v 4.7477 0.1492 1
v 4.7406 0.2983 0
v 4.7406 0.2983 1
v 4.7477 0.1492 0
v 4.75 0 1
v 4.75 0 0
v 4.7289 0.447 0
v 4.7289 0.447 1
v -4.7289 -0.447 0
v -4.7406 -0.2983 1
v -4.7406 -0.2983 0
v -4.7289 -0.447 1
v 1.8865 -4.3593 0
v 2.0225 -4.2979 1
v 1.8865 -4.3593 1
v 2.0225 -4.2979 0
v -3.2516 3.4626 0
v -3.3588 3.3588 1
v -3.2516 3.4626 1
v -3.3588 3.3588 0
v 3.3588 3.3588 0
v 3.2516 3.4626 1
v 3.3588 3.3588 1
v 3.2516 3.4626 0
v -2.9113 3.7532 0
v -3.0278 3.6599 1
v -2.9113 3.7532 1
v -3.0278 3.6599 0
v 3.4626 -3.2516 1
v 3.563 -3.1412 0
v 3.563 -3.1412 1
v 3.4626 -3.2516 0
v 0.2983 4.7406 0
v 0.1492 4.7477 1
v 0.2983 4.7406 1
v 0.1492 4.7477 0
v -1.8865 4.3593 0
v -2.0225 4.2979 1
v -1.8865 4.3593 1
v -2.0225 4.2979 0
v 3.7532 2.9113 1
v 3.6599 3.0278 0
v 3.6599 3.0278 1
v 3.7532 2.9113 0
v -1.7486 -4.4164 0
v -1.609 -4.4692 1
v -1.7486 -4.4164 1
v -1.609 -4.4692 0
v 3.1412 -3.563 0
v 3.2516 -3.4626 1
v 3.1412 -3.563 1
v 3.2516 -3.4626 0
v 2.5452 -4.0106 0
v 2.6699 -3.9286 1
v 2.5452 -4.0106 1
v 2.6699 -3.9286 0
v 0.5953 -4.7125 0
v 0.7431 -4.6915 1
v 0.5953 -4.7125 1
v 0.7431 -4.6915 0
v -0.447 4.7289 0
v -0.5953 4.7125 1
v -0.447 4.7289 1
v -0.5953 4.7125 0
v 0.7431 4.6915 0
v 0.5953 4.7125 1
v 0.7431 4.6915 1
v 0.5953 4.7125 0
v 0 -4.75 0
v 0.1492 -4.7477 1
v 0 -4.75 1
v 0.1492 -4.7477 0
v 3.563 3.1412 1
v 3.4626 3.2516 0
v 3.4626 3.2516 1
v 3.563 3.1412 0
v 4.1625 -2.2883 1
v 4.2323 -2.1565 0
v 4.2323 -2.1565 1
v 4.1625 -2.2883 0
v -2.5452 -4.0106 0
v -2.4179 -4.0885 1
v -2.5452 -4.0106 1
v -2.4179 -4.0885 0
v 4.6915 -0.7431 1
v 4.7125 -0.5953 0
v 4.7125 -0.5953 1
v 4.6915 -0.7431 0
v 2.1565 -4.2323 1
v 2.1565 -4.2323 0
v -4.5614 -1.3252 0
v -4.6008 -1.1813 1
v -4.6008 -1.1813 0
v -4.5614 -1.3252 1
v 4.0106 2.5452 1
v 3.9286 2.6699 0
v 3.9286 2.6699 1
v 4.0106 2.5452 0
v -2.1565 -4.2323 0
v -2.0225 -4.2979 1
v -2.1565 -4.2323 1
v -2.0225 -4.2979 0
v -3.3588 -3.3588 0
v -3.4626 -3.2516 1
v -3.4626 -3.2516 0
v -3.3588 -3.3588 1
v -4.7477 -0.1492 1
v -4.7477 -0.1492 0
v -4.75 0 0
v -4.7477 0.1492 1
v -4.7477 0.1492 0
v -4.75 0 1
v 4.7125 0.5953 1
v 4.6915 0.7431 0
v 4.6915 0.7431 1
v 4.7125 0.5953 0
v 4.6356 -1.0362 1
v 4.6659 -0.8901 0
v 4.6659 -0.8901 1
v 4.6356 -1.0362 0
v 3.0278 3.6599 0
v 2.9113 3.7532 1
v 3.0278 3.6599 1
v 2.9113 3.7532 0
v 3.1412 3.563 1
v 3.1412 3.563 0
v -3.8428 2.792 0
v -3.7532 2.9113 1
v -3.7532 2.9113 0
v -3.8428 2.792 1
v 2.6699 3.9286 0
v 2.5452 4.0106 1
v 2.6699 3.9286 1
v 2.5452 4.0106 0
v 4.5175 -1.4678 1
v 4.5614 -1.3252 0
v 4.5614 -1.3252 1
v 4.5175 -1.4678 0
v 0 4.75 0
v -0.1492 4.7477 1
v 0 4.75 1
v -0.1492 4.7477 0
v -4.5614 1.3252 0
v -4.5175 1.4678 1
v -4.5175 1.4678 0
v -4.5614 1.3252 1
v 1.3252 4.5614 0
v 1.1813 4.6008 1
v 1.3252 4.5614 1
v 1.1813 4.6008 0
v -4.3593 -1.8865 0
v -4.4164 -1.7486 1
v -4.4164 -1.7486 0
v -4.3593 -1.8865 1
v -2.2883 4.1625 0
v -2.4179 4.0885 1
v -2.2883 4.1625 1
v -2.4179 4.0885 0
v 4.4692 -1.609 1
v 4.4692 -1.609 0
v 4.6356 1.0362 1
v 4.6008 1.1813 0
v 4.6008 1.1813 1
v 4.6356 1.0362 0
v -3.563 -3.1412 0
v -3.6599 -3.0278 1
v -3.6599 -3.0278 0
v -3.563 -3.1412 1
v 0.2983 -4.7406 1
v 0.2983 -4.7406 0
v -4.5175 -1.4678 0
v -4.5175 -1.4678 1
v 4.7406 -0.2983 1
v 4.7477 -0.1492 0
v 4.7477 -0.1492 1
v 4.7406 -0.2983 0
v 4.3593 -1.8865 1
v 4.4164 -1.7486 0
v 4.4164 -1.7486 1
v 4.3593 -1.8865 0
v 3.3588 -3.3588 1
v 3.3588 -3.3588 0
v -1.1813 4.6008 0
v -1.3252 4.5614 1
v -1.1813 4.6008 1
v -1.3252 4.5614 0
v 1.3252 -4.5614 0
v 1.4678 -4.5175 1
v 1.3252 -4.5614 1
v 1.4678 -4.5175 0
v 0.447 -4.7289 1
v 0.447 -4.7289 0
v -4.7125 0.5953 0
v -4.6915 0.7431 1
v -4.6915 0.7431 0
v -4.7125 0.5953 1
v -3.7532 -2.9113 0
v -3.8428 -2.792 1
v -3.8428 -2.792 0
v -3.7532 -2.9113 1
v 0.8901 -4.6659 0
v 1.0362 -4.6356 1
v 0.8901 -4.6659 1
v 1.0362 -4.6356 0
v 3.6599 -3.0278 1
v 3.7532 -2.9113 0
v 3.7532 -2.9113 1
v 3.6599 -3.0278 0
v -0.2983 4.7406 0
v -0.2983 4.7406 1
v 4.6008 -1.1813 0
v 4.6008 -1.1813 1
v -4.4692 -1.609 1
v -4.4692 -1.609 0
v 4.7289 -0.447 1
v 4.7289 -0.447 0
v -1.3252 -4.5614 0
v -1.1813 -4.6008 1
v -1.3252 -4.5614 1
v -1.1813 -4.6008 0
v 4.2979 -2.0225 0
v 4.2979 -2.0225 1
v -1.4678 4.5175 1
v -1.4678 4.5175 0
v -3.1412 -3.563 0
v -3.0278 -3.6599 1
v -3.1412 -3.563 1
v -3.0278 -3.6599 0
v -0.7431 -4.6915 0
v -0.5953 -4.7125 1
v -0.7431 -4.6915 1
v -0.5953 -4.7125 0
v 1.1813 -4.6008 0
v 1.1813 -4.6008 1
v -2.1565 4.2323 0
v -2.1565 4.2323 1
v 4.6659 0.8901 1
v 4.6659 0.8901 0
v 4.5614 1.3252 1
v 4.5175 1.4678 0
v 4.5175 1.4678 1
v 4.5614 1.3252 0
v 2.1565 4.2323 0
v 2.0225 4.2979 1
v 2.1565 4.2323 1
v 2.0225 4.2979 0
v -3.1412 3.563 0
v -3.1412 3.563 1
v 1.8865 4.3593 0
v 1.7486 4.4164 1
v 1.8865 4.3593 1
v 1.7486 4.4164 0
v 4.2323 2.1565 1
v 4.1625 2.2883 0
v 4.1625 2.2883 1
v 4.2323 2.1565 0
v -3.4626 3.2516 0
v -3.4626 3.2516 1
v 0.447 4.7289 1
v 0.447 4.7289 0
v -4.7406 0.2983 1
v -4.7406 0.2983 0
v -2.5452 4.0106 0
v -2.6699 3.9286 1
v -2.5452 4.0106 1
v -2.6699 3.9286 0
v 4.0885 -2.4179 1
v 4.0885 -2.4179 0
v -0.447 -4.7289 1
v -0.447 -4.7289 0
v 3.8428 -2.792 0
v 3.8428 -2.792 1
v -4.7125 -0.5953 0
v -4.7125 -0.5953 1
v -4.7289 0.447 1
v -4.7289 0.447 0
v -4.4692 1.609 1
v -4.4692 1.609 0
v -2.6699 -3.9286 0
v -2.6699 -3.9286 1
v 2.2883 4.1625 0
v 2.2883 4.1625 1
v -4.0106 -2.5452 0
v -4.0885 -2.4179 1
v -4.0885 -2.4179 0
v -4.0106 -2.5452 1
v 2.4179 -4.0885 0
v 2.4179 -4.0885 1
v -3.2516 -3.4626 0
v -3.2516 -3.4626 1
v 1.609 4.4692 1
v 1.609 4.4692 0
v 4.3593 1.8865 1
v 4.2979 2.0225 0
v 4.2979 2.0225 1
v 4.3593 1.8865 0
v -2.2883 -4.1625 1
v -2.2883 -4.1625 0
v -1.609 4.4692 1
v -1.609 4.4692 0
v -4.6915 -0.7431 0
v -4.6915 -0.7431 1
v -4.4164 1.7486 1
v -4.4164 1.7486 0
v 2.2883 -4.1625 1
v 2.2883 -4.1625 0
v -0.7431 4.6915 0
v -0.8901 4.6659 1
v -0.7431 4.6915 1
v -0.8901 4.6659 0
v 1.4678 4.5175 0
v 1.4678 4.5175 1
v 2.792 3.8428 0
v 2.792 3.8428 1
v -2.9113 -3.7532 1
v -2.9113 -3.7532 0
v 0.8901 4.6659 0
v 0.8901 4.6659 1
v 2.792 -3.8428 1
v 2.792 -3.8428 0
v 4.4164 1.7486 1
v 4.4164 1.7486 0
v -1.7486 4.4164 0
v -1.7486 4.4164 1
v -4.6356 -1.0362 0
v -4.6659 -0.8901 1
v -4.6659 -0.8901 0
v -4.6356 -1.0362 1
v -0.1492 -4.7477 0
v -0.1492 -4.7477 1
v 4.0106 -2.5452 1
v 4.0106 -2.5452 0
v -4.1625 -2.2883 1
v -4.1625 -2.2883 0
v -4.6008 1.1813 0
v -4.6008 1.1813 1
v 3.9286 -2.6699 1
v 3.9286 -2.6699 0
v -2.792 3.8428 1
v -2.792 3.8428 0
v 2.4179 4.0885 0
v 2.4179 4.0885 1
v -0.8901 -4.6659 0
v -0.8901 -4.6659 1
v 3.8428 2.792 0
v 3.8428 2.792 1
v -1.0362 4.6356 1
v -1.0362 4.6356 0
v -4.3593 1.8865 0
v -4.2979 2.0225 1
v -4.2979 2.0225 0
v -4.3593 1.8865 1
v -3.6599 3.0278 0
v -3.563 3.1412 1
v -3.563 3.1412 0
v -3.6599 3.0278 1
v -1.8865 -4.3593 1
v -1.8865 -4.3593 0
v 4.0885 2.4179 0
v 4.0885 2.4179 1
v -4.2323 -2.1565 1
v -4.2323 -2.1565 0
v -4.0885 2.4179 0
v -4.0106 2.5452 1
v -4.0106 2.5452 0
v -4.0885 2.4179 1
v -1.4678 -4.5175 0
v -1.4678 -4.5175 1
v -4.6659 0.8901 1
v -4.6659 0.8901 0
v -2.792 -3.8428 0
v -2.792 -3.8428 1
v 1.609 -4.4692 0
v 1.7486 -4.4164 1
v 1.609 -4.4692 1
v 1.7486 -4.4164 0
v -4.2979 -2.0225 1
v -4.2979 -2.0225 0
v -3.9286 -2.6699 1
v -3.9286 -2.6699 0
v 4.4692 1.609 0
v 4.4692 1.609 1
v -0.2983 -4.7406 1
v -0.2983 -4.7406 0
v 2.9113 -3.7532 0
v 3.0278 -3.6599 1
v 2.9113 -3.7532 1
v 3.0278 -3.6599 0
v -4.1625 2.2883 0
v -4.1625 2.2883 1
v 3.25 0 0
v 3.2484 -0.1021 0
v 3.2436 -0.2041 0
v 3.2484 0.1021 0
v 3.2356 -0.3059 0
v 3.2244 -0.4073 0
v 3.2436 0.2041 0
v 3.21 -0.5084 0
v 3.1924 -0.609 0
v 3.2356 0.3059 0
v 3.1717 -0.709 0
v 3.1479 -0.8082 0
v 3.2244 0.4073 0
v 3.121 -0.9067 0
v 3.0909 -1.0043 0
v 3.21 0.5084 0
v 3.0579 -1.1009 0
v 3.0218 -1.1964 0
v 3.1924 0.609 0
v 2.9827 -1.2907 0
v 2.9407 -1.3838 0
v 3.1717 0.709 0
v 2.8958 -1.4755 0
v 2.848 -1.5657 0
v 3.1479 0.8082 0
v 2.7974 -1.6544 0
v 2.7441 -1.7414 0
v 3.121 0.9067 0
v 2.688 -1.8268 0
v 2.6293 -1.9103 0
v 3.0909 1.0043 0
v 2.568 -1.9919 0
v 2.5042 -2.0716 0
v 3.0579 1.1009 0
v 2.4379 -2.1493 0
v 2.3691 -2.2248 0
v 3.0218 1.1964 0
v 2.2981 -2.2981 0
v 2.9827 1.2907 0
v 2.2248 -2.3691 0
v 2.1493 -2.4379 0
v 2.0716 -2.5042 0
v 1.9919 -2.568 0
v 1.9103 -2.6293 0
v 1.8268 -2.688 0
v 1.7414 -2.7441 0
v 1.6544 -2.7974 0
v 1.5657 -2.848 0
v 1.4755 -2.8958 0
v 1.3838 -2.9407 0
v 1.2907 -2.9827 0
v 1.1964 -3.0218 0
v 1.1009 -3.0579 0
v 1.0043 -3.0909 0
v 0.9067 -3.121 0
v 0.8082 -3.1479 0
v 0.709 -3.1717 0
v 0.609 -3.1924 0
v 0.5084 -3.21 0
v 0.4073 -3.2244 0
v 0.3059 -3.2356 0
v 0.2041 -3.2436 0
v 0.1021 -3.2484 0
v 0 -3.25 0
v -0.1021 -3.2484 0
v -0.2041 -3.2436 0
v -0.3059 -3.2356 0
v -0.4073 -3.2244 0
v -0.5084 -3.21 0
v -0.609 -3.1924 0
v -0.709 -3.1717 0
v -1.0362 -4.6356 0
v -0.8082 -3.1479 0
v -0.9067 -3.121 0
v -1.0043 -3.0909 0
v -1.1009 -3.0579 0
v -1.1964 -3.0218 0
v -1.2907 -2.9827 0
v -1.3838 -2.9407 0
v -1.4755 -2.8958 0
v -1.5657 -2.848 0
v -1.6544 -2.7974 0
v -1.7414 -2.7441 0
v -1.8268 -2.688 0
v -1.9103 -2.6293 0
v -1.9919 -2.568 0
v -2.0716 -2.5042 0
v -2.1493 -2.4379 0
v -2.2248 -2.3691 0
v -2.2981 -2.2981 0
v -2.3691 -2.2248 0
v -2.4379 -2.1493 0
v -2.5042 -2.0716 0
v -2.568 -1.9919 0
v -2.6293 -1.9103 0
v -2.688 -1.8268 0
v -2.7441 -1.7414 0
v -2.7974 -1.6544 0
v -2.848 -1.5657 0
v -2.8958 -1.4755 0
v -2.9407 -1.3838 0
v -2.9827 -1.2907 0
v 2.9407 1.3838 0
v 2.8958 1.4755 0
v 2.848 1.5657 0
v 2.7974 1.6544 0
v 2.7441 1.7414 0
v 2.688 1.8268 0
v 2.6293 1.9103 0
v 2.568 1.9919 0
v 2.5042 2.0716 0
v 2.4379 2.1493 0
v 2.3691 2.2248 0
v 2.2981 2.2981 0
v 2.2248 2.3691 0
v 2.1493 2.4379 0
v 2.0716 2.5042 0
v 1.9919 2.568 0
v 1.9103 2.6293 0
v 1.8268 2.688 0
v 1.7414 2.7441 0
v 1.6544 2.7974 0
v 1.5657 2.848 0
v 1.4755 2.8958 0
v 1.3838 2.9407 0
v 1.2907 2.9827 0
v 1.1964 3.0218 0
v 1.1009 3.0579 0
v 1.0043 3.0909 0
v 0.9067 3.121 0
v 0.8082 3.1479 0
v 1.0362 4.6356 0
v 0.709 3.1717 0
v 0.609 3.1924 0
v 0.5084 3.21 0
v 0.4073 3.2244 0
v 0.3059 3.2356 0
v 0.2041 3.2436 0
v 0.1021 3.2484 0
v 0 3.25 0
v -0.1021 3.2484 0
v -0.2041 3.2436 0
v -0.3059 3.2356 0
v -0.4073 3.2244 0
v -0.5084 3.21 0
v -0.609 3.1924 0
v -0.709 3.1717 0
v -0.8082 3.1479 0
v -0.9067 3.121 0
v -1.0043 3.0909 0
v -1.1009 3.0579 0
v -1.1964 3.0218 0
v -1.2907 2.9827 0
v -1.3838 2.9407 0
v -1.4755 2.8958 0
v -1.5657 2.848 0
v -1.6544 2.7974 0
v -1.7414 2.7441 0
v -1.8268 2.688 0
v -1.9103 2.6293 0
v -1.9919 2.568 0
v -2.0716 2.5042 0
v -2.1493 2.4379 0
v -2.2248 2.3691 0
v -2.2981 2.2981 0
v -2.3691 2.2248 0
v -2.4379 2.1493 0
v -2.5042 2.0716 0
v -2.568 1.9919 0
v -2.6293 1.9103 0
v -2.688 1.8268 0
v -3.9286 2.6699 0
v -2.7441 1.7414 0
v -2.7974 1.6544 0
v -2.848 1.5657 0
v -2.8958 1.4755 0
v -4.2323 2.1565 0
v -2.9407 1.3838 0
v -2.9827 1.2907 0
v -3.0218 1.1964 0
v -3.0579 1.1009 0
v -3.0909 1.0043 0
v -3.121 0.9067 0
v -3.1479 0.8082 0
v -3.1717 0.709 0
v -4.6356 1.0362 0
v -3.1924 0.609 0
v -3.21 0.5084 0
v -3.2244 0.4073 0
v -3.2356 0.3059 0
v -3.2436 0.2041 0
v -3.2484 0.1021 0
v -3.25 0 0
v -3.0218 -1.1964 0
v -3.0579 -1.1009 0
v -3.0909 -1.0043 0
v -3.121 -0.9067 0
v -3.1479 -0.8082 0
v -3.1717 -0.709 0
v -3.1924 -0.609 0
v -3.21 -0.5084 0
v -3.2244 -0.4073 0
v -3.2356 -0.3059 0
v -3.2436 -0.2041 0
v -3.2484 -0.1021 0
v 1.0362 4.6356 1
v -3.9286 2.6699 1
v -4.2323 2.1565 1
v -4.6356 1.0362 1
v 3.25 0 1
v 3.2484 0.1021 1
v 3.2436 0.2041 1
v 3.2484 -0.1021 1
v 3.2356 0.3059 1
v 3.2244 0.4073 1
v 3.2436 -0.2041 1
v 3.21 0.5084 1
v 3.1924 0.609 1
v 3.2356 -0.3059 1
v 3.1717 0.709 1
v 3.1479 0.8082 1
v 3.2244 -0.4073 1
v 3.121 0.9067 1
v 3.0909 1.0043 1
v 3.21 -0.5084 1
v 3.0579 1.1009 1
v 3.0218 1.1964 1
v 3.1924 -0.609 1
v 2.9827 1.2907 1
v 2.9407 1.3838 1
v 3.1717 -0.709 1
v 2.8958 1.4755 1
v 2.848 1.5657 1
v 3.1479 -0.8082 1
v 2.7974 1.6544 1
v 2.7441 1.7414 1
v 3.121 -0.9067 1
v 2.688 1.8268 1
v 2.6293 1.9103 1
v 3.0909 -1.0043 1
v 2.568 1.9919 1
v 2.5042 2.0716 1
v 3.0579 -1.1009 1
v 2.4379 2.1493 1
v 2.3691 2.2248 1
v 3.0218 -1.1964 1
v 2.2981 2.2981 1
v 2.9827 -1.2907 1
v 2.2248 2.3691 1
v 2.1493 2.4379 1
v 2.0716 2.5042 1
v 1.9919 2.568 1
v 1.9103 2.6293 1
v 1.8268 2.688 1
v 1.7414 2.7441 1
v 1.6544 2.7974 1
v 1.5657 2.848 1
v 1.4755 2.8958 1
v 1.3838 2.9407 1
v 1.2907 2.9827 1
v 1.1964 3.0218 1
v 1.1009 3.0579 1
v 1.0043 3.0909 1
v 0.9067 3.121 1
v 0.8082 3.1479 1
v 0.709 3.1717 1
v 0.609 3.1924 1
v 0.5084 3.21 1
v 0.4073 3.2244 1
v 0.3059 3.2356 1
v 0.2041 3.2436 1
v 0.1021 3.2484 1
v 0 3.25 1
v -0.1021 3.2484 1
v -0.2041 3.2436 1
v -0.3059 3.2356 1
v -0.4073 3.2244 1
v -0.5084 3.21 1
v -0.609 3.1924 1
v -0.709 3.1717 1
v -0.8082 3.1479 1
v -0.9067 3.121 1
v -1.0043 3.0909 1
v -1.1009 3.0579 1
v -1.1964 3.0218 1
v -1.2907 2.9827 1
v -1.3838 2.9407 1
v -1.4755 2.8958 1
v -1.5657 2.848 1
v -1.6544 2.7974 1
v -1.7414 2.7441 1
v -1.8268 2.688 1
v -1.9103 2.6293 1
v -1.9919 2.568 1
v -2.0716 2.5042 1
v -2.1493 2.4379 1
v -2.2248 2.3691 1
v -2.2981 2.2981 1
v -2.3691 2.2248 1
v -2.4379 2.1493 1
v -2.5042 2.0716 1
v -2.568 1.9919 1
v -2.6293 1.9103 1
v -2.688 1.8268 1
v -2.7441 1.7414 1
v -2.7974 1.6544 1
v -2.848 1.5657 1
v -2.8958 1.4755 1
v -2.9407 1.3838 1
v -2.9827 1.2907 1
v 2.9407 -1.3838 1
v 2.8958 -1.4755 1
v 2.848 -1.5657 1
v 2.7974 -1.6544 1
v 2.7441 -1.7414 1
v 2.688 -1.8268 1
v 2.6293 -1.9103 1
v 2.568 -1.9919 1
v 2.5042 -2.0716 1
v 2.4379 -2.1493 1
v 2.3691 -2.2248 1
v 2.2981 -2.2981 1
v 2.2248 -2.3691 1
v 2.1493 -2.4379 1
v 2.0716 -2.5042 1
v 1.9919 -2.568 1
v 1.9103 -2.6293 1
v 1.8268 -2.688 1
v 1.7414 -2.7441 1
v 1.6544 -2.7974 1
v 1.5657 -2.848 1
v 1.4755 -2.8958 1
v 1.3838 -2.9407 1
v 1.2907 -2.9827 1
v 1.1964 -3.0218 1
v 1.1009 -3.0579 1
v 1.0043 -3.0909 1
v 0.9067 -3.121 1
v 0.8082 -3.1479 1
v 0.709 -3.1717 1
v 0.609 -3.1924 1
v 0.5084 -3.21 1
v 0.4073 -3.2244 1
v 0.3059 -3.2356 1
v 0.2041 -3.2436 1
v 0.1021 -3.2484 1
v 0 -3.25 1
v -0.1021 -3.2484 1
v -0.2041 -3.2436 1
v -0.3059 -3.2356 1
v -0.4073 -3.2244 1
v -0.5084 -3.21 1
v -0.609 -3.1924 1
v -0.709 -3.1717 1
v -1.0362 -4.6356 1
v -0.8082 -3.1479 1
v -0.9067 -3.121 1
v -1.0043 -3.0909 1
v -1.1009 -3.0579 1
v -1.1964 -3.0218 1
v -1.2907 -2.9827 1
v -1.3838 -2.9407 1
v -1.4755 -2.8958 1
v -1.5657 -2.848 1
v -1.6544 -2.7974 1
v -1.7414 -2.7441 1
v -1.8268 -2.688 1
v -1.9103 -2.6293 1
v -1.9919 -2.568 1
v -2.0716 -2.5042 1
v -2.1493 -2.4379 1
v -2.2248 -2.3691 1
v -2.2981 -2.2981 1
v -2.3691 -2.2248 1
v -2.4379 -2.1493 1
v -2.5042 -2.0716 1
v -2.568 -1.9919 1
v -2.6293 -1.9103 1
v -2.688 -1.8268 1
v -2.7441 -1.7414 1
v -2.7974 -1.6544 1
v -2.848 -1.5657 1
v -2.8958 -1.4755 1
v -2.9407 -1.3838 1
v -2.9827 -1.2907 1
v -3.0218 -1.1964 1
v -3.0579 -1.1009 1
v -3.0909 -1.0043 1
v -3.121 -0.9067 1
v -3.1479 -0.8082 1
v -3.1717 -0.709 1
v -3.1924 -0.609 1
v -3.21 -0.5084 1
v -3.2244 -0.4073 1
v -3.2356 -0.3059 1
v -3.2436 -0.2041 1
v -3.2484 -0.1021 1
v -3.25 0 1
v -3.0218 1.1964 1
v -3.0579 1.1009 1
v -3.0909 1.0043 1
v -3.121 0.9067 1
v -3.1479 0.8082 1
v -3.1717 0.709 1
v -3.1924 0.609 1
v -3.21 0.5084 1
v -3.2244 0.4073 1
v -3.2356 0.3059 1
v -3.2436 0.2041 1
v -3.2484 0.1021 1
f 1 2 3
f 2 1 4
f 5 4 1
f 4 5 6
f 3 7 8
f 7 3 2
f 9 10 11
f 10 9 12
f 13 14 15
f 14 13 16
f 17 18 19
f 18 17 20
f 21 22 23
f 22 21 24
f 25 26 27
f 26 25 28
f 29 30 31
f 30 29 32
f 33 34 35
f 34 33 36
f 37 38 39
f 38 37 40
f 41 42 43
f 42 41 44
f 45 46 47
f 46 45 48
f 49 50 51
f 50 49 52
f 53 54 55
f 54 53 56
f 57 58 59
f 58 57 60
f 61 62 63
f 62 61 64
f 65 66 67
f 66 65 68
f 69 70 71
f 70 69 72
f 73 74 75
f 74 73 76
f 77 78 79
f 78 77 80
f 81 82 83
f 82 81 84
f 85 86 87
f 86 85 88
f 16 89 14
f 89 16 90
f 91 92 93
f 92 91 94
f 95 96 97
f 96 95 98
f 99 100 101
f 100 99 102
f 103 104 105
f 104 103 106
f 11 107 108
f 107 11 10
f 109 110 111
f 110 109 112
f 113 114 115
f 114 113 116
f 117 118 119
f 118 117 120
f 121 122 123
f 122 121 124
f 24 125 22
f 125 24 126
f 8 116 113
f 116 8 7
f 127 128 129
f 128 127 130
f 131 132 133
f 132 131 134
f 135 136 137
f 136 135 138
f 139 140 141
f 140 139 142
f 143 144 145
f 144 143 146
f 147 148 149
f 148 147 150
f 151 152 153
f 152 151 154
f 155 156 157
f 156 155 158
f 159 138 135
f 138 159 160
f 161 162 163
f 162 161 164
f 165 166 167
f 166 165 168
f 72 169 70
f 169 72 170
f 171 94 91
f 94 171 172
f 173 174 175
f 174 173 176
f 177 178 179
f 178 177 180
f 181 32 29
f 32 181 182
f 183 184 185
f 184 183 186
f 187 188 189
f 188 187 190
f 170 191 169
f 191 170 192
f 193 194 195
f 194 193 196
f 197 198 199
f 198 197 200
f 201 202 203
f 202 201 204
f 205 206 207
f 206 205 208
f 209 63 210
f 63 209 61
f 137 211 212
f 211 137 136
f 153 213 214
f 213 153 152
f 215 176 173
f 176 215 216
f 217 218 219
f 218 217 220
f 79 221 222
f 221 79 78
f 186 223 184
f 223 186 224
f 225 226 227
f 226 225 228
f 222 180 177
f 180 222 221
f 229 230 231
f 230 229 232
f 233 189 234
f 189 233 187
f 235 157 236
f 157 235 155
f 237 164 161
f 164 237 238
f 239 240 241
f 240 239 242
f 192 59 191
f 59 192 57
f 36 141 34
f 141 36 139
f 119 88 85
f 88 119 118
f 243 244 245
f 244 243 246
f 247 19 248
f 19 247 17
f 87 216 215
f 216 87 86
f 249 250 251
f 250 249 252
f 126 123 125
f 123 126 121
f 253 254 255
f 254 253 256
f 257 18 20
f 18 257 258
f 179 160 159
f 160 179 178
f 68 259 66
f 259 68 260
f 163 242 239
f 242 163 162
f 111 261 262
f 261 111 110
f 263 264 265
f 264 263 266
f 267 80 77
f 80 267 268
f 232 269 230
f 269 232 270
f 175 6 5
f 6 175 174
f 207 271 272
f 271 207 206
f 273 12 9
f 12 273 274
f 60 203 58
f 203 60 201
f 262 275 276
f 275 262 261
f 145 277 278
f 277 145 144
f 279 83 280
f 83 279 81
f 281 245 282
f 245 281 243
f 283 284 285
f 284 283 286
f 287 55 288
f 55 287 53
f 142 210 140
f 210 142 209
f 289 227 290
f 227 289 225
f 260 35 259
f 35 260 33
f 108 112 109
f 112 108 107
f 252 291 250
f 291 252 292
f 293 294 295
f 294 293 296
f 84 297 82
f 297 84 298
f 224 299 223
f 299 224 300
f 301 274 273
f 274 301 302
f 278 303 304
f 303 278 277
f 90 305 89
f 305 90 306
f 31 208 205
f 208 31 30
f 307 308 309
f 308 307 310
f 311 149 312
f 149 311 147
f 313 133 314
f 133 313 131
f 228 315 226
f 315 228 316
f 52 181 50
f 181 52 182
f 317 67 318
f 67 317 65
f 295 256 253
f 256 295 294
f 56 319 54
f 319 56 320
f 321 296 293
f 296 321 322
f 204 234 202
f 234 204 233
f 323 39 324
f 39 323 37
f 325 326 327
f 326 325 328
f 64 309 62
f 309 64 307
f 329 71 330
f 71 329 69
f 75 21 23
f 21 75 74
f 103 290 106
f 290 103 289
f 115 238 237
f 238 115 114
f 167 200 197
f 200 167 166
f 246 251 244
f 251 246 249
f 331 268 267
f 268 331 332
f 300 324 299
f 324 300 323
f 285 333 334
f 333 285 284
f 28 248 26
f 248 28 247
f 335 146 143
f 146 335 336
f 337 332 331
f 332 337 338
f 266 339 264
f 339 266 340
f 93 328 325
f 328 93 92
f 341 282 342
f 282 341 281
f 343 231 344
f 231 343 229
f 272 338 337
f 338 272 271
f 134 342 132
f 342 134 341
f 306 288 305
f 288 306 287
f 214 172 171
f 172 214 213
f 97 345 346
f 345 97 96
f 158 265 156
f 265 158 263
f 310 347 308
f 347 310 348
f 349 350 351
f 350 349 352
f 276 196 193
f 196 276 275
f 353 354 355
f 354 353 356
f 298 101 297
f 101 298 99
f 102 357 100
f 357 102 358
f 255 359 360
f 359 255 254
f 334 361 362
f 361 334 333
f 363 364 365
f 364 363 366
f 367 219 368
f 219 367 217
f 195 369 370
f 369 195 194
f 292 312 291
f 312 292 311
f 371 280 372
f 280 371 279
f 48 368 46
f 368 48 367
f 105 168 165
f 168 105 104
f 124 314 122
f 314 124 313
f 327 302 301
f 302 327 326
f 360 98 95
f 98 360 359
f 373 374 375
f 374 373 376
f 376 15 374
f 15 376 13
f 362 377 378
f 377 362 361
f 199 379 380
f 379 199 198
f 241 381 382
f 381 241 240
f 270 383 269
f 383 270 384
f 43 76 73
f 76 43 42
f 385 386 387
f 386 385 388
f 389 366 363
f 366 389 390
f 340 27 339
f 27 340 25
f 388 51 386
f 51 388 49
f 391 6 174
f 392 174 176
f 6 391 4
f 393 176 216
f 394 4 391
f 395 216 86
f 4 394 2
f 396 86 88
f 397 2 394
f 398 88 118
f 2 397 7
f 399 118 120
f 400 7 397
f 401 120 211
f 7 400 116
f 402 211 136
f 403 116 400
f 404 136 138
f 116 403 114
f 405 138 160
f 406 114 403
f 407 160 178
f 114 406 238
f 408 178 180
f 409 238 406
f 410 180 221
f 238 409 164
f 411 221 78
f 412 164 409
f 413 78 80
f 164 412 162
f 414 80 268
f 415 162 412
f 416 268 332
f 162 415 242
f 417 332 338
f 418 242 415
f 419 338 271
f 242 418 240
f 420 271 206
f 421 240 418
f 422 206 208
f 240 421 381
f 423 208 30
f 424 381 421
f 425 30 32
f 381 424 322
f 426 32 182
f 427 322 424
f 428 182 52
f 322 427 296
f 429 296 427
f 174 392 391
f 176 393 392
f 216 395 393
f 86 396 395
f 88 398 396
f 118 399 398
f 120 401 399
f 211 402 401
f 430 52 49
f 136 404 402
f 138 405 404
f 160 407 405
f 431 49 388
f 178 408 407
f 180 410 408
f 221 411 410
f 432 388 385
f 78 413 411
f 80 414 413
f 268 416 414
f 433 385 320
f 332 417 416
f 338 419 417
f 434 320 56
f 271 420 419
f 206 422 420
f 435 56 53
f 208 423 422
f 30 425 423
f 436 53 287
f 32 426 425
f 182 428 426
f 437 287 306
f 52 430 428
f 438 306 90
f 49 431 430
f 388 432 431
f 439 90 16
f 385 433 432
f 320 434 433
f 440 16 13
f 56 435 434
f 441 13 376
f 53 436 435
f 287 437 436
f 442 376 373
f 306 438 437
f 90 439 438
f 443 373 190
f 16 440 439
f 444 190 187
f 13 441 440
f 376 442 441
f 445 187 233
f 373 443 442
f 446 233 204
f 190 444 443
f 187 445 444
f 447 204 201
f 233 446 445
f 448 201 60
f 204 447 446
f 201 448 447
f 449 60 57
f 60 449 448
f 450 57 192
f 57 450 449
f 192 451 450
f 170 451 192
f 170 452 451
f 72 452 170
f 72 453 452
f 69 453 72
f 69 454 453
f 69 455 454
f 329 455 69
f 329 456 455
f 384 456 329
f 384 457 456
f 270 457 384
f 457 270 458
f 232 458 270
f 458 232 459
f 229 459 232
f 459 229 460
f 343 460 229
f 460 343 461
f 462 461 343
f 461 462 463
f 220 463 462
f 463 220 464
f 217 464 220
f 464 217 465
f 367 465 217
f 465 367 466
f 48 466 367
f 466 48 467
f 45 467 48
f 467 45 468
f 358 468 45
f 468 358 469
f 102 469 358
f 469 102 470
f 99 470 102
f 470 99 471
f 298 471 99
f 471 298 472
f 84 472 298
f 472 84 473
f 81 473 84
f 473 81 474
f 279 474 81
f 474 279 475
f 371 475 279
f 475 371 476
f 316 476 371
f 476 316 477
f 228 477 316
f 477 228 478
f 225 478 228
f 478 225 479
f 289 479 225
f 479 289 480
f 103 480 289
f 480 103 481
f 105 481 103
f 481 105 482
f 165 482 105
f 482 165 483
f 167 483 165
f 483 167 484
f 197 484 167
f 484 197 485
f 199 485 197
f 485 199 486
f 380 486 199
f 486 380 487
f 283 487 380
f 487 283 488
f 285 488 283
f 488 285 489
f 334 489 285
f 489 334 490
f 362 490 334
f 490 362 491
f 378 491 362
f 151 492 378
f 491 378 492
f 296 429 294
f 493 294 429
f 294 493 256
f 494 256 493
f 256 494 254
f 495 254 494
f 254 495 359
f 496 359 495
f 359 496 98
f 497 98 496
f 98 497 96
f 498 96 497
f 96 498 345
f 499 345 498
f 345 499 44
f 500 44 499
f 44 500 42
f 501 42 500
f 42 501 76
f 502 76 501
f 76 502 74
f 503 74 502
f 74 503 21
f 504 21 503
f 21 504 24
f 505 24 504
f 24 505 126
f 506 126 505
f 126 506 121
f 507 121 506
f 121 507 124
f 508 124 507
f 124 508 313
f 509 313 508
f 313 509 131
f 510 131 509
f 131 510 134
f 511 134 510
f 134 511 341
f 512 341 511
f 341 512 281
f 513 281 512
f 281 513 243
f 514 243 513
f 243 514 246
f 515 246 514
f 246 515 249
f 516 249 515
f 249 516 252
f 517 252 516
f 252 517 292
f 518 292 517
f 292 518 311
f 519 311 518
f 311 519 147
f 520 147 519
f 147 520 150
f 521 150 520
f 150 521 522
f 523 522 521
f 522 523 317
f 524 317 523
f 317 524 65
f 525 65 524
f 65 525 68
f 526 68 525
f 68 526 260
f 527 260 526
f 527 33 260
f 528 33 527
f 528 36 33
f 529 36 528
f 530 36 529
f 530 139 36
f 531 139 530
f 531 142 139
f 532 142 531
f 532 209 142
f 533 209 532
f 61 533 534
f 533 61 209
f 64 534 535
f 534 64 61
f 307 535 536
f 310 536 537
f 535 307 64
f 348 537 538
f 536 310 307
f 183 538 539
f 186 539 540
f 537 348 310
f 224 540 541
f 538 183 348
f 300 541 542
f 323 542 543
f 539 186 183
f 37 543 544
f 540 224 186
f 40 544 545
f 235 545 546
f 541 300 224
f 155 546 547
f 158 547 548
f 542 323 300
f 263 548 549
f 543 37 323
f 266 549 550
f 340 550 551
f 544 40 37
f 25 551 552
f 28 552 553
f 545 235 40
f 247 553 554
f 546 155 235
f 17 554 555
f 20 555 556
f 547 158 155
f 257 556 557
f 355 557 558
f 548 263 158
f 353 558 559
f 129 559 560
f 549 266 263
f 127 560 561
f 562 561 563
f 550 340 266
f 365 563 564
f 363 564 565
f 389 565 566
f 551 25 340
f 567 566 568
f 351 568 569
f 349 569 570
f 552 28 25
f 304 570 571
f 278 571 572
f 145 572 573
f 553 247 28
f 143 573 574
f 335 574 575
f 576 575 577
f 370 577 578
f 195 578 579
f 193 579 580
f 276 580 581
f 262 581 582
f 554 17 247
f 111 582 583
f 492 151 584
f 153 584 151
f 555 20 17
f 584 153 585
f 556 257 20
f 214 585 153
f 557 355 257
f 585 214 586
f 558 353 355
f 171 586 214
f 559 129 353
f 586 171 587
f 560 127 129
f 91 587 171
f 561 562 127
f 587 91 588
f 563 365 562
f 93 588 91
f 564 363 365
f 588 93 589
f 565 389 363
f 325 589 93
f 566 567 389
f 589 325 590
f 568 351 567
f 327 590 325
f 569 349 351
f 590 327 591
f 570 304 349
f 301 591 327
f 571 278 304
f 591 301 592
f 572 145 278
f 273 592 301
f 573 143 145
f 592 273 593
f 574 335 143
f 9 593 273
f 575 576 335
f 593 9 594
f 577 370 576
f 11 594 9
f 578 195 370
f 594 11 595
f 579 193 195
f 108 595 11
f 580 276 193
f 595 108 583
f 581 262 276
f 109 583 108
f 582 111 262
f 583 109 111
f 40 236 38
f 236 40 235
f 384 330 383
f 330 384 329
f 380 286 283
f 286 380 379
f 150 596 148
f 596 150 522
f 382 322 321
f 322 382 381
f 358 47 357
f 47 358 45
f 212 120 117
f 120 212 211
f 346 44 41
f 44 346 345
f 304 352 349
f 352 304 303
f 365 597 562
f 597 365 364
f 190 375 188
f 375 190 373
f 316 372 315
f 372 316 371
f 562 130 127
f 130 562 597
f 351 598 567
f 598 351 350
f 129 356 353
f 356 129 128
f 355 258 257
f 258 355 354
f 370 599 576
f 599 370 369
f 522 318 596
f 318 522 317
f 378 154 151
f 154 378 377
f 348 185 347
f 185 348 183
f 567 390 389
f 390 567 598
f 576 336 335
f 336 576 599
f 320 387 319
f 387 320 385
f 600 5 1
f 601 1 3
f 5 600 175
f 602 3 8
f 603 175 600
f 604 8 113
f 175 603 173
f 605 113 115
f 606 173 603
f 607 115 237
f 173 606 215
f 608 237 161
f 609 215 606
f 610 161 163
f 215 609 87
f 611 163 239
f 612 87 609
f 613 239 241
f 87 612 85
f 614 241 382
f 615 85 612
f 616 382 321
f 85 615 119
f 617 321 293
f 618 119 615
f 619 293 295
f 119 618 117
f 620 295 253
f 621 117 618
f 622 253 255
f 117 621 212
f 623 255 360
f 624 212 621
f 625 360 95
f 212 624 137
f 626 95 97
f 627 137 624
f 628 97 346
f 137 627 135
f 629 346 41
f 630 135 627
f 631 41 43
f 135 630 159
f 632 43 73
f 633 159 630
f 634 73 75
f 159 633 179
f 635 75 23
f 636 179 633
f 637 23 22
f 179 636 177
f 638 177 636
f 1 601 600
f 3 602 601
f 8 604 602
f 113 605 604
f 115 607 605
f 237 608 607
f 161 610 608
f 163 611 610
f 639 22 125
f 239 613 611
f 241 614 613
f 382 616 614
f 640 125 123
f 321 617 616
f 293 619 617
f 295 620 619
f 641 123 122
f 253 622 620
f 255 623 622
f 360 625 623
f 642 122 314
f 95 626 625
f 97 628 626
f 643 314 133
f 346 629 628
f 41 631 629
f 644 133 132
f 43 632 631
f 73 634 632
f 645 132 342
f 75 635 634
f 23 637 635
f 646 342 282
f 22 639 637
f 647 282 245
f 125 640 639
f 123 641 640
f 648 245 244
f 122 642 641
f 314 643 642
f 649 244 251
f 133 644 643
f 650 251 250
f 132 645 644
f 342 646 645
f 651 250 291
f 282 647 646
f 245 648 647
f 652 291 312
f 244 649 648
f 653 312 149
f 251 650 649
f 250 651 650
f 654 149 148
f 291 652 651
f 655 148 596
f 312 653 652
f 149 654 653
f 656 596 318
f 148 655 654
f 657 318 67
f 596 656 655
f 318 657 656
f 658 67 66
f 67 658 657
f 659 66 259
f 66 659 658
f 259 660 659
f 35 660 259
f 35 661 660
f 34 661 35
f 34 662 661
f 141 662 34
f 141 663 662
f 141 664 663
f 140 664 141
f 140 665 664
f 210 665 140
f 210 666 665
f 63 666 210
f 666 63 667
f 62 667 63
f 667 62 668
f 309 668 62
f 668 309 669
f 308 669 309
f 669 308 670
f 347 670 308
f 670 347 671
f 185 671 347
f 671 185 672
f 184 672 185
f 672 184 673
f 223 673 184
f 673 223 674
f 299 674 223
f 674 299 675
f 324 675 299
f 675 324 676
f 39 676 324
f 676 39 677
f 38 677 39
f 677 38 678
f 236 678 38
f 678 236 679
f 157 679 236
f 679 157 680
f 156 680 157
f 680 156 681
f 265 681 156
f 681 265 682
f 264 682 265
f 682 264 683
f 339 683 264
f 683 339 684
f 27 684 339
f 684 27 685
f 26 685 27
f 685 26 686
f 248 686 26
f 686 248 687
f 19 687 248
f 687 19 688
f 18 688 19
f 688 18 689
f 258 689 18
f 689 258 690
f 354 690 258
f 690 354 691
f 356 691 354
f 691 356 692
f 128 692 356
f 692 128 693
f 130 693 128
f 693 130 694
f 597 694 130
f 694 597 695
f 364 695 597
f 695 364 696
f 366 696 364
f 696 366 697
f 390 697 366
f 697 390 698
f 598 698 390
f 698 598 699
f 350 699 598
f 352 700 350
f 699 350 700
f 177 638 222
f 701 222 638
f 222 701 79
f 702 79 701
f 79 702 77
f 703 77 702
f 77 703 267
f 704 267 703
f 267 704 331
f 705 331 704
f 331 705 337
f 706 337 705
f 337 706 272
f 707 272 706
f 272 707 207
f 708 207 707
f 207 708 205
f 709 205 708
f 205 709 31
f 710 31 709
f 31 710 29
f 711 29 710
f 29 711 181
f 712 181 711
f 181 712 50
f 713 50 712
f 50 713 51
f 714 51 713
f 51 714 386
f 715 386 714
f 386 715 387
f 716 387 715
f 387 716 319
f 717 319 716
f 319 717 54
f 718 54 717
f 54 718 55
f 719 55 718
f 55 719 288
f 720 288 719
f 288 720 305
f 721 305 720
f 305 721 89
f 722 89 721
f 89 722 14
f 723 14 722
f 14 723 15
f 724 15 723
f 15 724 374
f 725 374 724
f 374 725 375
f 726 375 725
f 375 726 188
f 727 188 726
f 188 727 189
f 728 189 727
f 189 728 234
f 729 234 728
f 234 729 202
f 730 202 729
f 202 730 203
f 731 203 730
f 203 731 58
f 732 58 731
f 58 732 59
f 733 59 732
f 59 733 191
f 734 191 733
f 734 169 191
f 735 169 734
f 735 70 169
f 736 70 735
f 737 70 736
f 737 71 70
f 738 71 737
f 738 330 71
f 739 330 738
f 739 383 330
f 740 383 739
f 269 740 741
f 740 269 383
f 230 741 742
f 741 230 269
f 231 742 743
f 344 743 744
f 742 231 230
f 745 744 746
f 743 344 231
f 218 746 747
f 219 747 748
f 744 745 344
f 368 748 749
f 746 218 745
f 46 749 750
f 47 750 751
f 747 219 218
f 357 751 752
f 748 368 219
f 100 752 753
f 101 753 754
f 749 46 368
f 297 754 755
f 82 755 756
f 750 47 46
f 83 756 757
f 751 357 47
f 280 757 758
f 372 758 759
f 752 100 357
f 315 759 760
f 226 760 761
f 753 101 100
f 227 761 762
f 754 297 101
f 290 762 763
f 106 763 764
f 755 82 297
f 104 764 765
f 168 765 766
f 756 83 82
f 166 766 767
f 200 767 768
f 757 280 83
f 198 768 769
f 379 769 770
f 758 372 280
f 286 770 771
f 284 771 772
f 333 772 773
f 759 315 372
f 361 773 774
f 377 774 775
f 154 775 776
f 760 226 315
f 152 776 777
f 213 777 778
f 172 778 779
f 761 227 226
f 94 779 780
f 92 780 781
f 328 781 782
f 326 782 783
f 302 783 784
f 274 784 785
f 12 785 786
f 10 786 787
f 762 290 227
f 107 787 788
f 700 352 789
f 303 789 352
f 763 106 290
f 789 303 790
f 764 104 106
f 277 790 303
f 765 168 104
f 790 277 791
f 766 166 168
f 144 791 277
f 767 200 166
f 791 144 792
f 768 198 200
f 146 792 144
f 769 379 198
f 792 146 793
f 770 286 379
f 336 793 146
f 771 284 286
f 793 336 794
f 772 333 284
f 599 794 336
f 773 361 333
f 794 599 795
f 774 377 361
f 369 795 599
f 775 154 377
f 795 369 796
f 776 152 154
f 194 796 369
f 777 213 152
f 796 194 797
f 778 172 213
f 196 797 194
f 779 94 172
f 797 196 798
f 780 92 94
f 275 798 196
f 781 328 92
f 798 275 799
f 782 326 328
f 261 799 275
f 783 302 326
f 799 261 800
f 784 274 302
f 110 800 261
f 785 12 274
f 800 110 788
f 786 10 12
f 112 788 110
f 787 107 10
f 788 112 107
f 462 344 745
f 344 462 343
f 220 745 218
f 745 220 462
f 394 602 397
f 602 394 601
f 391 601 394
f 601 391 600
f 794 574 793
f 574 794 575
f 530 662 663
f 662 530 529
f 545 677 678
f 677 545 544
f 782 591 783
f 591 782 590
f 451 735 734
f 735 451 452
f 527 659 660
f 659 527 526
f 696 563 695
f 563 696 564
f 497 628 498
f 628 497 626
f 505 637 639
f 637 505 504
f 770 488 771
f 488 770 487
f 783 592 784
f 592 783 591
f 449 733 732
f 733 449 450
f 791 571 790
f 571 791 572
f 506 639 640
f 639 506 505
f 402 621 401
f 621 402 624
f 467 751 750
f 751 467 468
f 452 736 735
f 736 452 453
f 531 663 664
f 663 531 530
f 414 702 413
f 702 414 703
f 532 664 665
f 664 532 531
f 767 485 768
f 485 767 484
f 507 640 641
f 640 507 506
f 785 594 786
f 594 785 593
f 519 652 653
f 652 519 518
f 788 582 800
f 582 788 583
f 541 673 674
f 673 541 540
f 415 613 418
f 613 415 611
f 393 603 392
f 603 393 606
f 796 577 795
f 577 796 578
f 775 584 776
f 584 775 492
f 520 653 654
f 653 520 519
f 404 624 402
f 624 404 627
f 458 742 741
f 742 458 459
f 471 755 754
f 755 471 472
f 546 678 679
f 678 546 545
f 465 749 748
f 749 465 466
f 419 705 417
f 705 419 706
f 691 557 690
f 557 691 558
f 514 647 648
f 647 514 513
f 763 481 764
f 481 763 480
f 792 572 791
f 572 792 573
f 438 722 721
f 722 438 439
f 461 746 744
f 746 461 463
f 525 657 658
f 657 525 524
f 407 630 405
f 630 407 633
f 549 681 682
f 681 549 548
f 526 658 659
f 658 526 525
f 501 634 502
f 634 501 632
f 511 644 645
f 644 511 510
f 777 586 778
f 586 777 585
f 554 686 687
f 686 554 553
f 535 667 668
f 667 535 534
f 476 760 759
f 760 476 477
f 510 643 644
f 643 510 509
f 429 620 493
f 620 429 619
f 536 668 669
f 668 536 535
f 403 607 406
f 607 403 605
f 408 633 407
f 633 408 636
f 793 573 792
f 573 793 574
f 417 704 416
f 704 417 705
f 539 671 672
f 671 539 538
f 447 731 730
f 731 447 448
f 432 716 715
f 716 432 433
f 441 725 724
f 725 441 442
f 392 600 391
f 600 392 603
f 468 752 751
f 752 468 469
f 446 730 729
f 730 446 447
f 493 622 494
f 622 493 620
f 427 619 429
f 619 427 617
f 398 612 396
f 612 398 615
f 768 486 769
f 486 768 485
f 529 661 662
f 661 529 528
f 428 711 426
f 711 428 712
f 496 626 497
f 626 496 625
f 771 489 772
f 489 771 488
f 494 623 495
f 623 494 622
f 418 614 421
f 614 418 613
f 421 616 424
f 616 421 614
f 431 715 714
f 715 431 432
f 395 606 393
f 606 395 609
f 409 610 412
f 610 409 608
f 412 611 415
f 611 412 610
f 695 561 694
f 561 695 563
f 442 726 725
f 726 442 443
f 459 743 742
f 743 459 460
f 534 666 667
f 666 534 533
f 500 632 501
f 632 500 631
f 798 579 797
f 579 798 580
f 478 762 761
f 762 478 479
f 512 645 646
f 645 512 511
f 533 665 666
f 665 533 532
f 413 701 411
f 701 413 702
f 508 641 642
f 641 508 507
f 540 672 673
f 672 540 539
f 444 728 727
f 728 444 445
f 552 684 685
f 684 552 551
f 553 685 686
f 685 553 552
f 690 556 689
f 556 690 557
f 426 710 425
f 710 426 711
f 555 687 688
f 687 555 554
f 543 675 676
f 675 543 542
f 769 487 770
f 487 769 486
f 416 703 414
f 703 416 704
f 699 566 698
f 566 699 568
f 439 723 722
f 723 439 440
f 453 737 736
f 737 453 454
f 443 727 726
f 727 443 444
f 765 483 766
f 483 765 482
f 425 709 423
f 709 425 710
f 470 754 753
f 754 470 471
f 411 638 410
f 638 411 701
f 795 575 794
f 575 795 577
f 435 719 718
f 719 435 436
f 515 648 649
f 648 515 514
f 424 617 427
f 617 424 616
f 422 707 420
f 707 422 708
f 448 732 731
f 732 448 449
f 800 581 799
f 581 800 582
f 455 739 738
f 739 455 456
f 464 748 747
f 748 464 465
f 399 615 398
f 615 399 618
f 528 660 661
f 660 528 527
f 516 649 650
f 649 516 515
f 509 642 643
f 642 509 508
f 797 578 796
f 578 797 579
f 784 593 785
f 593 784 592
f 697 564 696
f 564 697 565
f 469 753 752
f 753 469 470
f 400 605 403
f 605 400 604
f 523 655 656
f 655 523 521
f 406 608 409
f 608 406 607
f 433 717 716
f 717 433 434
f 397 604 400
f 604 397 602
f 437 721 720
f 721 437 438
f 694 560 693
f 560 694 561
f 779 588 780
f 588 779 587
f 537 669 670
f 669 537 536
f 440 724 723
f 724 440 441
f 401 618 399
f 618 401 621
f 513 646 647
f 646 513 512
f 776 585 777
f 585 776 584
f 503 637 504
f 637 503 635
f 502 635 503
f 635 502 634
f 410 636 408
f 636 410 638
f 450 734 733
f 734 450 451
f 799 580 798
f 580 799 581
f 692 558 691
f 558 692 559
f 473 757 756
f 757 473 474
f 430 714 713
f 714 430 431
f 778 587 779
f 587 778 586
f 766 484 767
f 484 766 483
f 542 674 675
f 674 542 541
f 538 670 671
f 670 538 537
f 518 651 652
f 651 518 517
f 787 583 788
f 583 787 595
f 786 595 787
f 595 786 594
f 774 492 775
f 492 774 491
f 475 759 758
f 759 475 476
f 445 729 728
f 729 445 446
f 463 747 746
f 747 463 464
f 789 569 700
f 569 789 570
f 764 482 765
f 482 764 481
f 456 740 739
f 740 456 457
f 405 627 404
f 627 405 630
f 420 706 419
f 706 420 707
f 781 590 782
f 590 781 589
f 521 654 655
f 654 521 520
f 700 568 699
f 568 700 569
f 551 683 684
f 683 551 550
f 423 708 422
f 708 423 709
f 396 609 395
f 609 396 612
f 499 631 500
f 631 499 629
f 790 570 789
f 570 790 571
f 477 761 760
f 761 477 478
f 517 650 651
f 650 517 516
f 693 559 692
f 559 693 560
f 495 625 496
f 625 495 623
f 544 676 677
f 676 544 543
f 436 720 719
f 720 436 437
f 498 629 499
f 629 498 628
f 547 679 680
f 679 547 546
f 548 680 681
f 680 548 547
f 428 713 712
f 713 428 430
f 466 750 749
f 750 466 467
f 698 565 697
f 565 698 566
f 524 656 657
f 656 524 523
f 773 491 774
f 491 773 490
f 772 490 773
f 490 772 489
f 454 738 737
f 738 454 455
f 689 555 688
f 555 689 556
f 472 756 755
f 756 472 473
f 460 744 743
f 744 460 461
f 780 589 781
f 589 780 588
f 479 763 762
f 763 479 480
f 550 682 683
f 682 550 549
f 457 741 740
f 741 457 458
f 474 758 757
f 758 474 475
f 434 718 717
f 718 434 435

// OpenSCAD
{
  thickness = 1;
  inner_diameter = 6.5;
  outer_diameter = 9.5;
  $fn = 200;
}

difference() {
  cylinder(d=outer_diameter, h=thickness);
  cylinder(d=inner_diameter, h=thickness);
}
